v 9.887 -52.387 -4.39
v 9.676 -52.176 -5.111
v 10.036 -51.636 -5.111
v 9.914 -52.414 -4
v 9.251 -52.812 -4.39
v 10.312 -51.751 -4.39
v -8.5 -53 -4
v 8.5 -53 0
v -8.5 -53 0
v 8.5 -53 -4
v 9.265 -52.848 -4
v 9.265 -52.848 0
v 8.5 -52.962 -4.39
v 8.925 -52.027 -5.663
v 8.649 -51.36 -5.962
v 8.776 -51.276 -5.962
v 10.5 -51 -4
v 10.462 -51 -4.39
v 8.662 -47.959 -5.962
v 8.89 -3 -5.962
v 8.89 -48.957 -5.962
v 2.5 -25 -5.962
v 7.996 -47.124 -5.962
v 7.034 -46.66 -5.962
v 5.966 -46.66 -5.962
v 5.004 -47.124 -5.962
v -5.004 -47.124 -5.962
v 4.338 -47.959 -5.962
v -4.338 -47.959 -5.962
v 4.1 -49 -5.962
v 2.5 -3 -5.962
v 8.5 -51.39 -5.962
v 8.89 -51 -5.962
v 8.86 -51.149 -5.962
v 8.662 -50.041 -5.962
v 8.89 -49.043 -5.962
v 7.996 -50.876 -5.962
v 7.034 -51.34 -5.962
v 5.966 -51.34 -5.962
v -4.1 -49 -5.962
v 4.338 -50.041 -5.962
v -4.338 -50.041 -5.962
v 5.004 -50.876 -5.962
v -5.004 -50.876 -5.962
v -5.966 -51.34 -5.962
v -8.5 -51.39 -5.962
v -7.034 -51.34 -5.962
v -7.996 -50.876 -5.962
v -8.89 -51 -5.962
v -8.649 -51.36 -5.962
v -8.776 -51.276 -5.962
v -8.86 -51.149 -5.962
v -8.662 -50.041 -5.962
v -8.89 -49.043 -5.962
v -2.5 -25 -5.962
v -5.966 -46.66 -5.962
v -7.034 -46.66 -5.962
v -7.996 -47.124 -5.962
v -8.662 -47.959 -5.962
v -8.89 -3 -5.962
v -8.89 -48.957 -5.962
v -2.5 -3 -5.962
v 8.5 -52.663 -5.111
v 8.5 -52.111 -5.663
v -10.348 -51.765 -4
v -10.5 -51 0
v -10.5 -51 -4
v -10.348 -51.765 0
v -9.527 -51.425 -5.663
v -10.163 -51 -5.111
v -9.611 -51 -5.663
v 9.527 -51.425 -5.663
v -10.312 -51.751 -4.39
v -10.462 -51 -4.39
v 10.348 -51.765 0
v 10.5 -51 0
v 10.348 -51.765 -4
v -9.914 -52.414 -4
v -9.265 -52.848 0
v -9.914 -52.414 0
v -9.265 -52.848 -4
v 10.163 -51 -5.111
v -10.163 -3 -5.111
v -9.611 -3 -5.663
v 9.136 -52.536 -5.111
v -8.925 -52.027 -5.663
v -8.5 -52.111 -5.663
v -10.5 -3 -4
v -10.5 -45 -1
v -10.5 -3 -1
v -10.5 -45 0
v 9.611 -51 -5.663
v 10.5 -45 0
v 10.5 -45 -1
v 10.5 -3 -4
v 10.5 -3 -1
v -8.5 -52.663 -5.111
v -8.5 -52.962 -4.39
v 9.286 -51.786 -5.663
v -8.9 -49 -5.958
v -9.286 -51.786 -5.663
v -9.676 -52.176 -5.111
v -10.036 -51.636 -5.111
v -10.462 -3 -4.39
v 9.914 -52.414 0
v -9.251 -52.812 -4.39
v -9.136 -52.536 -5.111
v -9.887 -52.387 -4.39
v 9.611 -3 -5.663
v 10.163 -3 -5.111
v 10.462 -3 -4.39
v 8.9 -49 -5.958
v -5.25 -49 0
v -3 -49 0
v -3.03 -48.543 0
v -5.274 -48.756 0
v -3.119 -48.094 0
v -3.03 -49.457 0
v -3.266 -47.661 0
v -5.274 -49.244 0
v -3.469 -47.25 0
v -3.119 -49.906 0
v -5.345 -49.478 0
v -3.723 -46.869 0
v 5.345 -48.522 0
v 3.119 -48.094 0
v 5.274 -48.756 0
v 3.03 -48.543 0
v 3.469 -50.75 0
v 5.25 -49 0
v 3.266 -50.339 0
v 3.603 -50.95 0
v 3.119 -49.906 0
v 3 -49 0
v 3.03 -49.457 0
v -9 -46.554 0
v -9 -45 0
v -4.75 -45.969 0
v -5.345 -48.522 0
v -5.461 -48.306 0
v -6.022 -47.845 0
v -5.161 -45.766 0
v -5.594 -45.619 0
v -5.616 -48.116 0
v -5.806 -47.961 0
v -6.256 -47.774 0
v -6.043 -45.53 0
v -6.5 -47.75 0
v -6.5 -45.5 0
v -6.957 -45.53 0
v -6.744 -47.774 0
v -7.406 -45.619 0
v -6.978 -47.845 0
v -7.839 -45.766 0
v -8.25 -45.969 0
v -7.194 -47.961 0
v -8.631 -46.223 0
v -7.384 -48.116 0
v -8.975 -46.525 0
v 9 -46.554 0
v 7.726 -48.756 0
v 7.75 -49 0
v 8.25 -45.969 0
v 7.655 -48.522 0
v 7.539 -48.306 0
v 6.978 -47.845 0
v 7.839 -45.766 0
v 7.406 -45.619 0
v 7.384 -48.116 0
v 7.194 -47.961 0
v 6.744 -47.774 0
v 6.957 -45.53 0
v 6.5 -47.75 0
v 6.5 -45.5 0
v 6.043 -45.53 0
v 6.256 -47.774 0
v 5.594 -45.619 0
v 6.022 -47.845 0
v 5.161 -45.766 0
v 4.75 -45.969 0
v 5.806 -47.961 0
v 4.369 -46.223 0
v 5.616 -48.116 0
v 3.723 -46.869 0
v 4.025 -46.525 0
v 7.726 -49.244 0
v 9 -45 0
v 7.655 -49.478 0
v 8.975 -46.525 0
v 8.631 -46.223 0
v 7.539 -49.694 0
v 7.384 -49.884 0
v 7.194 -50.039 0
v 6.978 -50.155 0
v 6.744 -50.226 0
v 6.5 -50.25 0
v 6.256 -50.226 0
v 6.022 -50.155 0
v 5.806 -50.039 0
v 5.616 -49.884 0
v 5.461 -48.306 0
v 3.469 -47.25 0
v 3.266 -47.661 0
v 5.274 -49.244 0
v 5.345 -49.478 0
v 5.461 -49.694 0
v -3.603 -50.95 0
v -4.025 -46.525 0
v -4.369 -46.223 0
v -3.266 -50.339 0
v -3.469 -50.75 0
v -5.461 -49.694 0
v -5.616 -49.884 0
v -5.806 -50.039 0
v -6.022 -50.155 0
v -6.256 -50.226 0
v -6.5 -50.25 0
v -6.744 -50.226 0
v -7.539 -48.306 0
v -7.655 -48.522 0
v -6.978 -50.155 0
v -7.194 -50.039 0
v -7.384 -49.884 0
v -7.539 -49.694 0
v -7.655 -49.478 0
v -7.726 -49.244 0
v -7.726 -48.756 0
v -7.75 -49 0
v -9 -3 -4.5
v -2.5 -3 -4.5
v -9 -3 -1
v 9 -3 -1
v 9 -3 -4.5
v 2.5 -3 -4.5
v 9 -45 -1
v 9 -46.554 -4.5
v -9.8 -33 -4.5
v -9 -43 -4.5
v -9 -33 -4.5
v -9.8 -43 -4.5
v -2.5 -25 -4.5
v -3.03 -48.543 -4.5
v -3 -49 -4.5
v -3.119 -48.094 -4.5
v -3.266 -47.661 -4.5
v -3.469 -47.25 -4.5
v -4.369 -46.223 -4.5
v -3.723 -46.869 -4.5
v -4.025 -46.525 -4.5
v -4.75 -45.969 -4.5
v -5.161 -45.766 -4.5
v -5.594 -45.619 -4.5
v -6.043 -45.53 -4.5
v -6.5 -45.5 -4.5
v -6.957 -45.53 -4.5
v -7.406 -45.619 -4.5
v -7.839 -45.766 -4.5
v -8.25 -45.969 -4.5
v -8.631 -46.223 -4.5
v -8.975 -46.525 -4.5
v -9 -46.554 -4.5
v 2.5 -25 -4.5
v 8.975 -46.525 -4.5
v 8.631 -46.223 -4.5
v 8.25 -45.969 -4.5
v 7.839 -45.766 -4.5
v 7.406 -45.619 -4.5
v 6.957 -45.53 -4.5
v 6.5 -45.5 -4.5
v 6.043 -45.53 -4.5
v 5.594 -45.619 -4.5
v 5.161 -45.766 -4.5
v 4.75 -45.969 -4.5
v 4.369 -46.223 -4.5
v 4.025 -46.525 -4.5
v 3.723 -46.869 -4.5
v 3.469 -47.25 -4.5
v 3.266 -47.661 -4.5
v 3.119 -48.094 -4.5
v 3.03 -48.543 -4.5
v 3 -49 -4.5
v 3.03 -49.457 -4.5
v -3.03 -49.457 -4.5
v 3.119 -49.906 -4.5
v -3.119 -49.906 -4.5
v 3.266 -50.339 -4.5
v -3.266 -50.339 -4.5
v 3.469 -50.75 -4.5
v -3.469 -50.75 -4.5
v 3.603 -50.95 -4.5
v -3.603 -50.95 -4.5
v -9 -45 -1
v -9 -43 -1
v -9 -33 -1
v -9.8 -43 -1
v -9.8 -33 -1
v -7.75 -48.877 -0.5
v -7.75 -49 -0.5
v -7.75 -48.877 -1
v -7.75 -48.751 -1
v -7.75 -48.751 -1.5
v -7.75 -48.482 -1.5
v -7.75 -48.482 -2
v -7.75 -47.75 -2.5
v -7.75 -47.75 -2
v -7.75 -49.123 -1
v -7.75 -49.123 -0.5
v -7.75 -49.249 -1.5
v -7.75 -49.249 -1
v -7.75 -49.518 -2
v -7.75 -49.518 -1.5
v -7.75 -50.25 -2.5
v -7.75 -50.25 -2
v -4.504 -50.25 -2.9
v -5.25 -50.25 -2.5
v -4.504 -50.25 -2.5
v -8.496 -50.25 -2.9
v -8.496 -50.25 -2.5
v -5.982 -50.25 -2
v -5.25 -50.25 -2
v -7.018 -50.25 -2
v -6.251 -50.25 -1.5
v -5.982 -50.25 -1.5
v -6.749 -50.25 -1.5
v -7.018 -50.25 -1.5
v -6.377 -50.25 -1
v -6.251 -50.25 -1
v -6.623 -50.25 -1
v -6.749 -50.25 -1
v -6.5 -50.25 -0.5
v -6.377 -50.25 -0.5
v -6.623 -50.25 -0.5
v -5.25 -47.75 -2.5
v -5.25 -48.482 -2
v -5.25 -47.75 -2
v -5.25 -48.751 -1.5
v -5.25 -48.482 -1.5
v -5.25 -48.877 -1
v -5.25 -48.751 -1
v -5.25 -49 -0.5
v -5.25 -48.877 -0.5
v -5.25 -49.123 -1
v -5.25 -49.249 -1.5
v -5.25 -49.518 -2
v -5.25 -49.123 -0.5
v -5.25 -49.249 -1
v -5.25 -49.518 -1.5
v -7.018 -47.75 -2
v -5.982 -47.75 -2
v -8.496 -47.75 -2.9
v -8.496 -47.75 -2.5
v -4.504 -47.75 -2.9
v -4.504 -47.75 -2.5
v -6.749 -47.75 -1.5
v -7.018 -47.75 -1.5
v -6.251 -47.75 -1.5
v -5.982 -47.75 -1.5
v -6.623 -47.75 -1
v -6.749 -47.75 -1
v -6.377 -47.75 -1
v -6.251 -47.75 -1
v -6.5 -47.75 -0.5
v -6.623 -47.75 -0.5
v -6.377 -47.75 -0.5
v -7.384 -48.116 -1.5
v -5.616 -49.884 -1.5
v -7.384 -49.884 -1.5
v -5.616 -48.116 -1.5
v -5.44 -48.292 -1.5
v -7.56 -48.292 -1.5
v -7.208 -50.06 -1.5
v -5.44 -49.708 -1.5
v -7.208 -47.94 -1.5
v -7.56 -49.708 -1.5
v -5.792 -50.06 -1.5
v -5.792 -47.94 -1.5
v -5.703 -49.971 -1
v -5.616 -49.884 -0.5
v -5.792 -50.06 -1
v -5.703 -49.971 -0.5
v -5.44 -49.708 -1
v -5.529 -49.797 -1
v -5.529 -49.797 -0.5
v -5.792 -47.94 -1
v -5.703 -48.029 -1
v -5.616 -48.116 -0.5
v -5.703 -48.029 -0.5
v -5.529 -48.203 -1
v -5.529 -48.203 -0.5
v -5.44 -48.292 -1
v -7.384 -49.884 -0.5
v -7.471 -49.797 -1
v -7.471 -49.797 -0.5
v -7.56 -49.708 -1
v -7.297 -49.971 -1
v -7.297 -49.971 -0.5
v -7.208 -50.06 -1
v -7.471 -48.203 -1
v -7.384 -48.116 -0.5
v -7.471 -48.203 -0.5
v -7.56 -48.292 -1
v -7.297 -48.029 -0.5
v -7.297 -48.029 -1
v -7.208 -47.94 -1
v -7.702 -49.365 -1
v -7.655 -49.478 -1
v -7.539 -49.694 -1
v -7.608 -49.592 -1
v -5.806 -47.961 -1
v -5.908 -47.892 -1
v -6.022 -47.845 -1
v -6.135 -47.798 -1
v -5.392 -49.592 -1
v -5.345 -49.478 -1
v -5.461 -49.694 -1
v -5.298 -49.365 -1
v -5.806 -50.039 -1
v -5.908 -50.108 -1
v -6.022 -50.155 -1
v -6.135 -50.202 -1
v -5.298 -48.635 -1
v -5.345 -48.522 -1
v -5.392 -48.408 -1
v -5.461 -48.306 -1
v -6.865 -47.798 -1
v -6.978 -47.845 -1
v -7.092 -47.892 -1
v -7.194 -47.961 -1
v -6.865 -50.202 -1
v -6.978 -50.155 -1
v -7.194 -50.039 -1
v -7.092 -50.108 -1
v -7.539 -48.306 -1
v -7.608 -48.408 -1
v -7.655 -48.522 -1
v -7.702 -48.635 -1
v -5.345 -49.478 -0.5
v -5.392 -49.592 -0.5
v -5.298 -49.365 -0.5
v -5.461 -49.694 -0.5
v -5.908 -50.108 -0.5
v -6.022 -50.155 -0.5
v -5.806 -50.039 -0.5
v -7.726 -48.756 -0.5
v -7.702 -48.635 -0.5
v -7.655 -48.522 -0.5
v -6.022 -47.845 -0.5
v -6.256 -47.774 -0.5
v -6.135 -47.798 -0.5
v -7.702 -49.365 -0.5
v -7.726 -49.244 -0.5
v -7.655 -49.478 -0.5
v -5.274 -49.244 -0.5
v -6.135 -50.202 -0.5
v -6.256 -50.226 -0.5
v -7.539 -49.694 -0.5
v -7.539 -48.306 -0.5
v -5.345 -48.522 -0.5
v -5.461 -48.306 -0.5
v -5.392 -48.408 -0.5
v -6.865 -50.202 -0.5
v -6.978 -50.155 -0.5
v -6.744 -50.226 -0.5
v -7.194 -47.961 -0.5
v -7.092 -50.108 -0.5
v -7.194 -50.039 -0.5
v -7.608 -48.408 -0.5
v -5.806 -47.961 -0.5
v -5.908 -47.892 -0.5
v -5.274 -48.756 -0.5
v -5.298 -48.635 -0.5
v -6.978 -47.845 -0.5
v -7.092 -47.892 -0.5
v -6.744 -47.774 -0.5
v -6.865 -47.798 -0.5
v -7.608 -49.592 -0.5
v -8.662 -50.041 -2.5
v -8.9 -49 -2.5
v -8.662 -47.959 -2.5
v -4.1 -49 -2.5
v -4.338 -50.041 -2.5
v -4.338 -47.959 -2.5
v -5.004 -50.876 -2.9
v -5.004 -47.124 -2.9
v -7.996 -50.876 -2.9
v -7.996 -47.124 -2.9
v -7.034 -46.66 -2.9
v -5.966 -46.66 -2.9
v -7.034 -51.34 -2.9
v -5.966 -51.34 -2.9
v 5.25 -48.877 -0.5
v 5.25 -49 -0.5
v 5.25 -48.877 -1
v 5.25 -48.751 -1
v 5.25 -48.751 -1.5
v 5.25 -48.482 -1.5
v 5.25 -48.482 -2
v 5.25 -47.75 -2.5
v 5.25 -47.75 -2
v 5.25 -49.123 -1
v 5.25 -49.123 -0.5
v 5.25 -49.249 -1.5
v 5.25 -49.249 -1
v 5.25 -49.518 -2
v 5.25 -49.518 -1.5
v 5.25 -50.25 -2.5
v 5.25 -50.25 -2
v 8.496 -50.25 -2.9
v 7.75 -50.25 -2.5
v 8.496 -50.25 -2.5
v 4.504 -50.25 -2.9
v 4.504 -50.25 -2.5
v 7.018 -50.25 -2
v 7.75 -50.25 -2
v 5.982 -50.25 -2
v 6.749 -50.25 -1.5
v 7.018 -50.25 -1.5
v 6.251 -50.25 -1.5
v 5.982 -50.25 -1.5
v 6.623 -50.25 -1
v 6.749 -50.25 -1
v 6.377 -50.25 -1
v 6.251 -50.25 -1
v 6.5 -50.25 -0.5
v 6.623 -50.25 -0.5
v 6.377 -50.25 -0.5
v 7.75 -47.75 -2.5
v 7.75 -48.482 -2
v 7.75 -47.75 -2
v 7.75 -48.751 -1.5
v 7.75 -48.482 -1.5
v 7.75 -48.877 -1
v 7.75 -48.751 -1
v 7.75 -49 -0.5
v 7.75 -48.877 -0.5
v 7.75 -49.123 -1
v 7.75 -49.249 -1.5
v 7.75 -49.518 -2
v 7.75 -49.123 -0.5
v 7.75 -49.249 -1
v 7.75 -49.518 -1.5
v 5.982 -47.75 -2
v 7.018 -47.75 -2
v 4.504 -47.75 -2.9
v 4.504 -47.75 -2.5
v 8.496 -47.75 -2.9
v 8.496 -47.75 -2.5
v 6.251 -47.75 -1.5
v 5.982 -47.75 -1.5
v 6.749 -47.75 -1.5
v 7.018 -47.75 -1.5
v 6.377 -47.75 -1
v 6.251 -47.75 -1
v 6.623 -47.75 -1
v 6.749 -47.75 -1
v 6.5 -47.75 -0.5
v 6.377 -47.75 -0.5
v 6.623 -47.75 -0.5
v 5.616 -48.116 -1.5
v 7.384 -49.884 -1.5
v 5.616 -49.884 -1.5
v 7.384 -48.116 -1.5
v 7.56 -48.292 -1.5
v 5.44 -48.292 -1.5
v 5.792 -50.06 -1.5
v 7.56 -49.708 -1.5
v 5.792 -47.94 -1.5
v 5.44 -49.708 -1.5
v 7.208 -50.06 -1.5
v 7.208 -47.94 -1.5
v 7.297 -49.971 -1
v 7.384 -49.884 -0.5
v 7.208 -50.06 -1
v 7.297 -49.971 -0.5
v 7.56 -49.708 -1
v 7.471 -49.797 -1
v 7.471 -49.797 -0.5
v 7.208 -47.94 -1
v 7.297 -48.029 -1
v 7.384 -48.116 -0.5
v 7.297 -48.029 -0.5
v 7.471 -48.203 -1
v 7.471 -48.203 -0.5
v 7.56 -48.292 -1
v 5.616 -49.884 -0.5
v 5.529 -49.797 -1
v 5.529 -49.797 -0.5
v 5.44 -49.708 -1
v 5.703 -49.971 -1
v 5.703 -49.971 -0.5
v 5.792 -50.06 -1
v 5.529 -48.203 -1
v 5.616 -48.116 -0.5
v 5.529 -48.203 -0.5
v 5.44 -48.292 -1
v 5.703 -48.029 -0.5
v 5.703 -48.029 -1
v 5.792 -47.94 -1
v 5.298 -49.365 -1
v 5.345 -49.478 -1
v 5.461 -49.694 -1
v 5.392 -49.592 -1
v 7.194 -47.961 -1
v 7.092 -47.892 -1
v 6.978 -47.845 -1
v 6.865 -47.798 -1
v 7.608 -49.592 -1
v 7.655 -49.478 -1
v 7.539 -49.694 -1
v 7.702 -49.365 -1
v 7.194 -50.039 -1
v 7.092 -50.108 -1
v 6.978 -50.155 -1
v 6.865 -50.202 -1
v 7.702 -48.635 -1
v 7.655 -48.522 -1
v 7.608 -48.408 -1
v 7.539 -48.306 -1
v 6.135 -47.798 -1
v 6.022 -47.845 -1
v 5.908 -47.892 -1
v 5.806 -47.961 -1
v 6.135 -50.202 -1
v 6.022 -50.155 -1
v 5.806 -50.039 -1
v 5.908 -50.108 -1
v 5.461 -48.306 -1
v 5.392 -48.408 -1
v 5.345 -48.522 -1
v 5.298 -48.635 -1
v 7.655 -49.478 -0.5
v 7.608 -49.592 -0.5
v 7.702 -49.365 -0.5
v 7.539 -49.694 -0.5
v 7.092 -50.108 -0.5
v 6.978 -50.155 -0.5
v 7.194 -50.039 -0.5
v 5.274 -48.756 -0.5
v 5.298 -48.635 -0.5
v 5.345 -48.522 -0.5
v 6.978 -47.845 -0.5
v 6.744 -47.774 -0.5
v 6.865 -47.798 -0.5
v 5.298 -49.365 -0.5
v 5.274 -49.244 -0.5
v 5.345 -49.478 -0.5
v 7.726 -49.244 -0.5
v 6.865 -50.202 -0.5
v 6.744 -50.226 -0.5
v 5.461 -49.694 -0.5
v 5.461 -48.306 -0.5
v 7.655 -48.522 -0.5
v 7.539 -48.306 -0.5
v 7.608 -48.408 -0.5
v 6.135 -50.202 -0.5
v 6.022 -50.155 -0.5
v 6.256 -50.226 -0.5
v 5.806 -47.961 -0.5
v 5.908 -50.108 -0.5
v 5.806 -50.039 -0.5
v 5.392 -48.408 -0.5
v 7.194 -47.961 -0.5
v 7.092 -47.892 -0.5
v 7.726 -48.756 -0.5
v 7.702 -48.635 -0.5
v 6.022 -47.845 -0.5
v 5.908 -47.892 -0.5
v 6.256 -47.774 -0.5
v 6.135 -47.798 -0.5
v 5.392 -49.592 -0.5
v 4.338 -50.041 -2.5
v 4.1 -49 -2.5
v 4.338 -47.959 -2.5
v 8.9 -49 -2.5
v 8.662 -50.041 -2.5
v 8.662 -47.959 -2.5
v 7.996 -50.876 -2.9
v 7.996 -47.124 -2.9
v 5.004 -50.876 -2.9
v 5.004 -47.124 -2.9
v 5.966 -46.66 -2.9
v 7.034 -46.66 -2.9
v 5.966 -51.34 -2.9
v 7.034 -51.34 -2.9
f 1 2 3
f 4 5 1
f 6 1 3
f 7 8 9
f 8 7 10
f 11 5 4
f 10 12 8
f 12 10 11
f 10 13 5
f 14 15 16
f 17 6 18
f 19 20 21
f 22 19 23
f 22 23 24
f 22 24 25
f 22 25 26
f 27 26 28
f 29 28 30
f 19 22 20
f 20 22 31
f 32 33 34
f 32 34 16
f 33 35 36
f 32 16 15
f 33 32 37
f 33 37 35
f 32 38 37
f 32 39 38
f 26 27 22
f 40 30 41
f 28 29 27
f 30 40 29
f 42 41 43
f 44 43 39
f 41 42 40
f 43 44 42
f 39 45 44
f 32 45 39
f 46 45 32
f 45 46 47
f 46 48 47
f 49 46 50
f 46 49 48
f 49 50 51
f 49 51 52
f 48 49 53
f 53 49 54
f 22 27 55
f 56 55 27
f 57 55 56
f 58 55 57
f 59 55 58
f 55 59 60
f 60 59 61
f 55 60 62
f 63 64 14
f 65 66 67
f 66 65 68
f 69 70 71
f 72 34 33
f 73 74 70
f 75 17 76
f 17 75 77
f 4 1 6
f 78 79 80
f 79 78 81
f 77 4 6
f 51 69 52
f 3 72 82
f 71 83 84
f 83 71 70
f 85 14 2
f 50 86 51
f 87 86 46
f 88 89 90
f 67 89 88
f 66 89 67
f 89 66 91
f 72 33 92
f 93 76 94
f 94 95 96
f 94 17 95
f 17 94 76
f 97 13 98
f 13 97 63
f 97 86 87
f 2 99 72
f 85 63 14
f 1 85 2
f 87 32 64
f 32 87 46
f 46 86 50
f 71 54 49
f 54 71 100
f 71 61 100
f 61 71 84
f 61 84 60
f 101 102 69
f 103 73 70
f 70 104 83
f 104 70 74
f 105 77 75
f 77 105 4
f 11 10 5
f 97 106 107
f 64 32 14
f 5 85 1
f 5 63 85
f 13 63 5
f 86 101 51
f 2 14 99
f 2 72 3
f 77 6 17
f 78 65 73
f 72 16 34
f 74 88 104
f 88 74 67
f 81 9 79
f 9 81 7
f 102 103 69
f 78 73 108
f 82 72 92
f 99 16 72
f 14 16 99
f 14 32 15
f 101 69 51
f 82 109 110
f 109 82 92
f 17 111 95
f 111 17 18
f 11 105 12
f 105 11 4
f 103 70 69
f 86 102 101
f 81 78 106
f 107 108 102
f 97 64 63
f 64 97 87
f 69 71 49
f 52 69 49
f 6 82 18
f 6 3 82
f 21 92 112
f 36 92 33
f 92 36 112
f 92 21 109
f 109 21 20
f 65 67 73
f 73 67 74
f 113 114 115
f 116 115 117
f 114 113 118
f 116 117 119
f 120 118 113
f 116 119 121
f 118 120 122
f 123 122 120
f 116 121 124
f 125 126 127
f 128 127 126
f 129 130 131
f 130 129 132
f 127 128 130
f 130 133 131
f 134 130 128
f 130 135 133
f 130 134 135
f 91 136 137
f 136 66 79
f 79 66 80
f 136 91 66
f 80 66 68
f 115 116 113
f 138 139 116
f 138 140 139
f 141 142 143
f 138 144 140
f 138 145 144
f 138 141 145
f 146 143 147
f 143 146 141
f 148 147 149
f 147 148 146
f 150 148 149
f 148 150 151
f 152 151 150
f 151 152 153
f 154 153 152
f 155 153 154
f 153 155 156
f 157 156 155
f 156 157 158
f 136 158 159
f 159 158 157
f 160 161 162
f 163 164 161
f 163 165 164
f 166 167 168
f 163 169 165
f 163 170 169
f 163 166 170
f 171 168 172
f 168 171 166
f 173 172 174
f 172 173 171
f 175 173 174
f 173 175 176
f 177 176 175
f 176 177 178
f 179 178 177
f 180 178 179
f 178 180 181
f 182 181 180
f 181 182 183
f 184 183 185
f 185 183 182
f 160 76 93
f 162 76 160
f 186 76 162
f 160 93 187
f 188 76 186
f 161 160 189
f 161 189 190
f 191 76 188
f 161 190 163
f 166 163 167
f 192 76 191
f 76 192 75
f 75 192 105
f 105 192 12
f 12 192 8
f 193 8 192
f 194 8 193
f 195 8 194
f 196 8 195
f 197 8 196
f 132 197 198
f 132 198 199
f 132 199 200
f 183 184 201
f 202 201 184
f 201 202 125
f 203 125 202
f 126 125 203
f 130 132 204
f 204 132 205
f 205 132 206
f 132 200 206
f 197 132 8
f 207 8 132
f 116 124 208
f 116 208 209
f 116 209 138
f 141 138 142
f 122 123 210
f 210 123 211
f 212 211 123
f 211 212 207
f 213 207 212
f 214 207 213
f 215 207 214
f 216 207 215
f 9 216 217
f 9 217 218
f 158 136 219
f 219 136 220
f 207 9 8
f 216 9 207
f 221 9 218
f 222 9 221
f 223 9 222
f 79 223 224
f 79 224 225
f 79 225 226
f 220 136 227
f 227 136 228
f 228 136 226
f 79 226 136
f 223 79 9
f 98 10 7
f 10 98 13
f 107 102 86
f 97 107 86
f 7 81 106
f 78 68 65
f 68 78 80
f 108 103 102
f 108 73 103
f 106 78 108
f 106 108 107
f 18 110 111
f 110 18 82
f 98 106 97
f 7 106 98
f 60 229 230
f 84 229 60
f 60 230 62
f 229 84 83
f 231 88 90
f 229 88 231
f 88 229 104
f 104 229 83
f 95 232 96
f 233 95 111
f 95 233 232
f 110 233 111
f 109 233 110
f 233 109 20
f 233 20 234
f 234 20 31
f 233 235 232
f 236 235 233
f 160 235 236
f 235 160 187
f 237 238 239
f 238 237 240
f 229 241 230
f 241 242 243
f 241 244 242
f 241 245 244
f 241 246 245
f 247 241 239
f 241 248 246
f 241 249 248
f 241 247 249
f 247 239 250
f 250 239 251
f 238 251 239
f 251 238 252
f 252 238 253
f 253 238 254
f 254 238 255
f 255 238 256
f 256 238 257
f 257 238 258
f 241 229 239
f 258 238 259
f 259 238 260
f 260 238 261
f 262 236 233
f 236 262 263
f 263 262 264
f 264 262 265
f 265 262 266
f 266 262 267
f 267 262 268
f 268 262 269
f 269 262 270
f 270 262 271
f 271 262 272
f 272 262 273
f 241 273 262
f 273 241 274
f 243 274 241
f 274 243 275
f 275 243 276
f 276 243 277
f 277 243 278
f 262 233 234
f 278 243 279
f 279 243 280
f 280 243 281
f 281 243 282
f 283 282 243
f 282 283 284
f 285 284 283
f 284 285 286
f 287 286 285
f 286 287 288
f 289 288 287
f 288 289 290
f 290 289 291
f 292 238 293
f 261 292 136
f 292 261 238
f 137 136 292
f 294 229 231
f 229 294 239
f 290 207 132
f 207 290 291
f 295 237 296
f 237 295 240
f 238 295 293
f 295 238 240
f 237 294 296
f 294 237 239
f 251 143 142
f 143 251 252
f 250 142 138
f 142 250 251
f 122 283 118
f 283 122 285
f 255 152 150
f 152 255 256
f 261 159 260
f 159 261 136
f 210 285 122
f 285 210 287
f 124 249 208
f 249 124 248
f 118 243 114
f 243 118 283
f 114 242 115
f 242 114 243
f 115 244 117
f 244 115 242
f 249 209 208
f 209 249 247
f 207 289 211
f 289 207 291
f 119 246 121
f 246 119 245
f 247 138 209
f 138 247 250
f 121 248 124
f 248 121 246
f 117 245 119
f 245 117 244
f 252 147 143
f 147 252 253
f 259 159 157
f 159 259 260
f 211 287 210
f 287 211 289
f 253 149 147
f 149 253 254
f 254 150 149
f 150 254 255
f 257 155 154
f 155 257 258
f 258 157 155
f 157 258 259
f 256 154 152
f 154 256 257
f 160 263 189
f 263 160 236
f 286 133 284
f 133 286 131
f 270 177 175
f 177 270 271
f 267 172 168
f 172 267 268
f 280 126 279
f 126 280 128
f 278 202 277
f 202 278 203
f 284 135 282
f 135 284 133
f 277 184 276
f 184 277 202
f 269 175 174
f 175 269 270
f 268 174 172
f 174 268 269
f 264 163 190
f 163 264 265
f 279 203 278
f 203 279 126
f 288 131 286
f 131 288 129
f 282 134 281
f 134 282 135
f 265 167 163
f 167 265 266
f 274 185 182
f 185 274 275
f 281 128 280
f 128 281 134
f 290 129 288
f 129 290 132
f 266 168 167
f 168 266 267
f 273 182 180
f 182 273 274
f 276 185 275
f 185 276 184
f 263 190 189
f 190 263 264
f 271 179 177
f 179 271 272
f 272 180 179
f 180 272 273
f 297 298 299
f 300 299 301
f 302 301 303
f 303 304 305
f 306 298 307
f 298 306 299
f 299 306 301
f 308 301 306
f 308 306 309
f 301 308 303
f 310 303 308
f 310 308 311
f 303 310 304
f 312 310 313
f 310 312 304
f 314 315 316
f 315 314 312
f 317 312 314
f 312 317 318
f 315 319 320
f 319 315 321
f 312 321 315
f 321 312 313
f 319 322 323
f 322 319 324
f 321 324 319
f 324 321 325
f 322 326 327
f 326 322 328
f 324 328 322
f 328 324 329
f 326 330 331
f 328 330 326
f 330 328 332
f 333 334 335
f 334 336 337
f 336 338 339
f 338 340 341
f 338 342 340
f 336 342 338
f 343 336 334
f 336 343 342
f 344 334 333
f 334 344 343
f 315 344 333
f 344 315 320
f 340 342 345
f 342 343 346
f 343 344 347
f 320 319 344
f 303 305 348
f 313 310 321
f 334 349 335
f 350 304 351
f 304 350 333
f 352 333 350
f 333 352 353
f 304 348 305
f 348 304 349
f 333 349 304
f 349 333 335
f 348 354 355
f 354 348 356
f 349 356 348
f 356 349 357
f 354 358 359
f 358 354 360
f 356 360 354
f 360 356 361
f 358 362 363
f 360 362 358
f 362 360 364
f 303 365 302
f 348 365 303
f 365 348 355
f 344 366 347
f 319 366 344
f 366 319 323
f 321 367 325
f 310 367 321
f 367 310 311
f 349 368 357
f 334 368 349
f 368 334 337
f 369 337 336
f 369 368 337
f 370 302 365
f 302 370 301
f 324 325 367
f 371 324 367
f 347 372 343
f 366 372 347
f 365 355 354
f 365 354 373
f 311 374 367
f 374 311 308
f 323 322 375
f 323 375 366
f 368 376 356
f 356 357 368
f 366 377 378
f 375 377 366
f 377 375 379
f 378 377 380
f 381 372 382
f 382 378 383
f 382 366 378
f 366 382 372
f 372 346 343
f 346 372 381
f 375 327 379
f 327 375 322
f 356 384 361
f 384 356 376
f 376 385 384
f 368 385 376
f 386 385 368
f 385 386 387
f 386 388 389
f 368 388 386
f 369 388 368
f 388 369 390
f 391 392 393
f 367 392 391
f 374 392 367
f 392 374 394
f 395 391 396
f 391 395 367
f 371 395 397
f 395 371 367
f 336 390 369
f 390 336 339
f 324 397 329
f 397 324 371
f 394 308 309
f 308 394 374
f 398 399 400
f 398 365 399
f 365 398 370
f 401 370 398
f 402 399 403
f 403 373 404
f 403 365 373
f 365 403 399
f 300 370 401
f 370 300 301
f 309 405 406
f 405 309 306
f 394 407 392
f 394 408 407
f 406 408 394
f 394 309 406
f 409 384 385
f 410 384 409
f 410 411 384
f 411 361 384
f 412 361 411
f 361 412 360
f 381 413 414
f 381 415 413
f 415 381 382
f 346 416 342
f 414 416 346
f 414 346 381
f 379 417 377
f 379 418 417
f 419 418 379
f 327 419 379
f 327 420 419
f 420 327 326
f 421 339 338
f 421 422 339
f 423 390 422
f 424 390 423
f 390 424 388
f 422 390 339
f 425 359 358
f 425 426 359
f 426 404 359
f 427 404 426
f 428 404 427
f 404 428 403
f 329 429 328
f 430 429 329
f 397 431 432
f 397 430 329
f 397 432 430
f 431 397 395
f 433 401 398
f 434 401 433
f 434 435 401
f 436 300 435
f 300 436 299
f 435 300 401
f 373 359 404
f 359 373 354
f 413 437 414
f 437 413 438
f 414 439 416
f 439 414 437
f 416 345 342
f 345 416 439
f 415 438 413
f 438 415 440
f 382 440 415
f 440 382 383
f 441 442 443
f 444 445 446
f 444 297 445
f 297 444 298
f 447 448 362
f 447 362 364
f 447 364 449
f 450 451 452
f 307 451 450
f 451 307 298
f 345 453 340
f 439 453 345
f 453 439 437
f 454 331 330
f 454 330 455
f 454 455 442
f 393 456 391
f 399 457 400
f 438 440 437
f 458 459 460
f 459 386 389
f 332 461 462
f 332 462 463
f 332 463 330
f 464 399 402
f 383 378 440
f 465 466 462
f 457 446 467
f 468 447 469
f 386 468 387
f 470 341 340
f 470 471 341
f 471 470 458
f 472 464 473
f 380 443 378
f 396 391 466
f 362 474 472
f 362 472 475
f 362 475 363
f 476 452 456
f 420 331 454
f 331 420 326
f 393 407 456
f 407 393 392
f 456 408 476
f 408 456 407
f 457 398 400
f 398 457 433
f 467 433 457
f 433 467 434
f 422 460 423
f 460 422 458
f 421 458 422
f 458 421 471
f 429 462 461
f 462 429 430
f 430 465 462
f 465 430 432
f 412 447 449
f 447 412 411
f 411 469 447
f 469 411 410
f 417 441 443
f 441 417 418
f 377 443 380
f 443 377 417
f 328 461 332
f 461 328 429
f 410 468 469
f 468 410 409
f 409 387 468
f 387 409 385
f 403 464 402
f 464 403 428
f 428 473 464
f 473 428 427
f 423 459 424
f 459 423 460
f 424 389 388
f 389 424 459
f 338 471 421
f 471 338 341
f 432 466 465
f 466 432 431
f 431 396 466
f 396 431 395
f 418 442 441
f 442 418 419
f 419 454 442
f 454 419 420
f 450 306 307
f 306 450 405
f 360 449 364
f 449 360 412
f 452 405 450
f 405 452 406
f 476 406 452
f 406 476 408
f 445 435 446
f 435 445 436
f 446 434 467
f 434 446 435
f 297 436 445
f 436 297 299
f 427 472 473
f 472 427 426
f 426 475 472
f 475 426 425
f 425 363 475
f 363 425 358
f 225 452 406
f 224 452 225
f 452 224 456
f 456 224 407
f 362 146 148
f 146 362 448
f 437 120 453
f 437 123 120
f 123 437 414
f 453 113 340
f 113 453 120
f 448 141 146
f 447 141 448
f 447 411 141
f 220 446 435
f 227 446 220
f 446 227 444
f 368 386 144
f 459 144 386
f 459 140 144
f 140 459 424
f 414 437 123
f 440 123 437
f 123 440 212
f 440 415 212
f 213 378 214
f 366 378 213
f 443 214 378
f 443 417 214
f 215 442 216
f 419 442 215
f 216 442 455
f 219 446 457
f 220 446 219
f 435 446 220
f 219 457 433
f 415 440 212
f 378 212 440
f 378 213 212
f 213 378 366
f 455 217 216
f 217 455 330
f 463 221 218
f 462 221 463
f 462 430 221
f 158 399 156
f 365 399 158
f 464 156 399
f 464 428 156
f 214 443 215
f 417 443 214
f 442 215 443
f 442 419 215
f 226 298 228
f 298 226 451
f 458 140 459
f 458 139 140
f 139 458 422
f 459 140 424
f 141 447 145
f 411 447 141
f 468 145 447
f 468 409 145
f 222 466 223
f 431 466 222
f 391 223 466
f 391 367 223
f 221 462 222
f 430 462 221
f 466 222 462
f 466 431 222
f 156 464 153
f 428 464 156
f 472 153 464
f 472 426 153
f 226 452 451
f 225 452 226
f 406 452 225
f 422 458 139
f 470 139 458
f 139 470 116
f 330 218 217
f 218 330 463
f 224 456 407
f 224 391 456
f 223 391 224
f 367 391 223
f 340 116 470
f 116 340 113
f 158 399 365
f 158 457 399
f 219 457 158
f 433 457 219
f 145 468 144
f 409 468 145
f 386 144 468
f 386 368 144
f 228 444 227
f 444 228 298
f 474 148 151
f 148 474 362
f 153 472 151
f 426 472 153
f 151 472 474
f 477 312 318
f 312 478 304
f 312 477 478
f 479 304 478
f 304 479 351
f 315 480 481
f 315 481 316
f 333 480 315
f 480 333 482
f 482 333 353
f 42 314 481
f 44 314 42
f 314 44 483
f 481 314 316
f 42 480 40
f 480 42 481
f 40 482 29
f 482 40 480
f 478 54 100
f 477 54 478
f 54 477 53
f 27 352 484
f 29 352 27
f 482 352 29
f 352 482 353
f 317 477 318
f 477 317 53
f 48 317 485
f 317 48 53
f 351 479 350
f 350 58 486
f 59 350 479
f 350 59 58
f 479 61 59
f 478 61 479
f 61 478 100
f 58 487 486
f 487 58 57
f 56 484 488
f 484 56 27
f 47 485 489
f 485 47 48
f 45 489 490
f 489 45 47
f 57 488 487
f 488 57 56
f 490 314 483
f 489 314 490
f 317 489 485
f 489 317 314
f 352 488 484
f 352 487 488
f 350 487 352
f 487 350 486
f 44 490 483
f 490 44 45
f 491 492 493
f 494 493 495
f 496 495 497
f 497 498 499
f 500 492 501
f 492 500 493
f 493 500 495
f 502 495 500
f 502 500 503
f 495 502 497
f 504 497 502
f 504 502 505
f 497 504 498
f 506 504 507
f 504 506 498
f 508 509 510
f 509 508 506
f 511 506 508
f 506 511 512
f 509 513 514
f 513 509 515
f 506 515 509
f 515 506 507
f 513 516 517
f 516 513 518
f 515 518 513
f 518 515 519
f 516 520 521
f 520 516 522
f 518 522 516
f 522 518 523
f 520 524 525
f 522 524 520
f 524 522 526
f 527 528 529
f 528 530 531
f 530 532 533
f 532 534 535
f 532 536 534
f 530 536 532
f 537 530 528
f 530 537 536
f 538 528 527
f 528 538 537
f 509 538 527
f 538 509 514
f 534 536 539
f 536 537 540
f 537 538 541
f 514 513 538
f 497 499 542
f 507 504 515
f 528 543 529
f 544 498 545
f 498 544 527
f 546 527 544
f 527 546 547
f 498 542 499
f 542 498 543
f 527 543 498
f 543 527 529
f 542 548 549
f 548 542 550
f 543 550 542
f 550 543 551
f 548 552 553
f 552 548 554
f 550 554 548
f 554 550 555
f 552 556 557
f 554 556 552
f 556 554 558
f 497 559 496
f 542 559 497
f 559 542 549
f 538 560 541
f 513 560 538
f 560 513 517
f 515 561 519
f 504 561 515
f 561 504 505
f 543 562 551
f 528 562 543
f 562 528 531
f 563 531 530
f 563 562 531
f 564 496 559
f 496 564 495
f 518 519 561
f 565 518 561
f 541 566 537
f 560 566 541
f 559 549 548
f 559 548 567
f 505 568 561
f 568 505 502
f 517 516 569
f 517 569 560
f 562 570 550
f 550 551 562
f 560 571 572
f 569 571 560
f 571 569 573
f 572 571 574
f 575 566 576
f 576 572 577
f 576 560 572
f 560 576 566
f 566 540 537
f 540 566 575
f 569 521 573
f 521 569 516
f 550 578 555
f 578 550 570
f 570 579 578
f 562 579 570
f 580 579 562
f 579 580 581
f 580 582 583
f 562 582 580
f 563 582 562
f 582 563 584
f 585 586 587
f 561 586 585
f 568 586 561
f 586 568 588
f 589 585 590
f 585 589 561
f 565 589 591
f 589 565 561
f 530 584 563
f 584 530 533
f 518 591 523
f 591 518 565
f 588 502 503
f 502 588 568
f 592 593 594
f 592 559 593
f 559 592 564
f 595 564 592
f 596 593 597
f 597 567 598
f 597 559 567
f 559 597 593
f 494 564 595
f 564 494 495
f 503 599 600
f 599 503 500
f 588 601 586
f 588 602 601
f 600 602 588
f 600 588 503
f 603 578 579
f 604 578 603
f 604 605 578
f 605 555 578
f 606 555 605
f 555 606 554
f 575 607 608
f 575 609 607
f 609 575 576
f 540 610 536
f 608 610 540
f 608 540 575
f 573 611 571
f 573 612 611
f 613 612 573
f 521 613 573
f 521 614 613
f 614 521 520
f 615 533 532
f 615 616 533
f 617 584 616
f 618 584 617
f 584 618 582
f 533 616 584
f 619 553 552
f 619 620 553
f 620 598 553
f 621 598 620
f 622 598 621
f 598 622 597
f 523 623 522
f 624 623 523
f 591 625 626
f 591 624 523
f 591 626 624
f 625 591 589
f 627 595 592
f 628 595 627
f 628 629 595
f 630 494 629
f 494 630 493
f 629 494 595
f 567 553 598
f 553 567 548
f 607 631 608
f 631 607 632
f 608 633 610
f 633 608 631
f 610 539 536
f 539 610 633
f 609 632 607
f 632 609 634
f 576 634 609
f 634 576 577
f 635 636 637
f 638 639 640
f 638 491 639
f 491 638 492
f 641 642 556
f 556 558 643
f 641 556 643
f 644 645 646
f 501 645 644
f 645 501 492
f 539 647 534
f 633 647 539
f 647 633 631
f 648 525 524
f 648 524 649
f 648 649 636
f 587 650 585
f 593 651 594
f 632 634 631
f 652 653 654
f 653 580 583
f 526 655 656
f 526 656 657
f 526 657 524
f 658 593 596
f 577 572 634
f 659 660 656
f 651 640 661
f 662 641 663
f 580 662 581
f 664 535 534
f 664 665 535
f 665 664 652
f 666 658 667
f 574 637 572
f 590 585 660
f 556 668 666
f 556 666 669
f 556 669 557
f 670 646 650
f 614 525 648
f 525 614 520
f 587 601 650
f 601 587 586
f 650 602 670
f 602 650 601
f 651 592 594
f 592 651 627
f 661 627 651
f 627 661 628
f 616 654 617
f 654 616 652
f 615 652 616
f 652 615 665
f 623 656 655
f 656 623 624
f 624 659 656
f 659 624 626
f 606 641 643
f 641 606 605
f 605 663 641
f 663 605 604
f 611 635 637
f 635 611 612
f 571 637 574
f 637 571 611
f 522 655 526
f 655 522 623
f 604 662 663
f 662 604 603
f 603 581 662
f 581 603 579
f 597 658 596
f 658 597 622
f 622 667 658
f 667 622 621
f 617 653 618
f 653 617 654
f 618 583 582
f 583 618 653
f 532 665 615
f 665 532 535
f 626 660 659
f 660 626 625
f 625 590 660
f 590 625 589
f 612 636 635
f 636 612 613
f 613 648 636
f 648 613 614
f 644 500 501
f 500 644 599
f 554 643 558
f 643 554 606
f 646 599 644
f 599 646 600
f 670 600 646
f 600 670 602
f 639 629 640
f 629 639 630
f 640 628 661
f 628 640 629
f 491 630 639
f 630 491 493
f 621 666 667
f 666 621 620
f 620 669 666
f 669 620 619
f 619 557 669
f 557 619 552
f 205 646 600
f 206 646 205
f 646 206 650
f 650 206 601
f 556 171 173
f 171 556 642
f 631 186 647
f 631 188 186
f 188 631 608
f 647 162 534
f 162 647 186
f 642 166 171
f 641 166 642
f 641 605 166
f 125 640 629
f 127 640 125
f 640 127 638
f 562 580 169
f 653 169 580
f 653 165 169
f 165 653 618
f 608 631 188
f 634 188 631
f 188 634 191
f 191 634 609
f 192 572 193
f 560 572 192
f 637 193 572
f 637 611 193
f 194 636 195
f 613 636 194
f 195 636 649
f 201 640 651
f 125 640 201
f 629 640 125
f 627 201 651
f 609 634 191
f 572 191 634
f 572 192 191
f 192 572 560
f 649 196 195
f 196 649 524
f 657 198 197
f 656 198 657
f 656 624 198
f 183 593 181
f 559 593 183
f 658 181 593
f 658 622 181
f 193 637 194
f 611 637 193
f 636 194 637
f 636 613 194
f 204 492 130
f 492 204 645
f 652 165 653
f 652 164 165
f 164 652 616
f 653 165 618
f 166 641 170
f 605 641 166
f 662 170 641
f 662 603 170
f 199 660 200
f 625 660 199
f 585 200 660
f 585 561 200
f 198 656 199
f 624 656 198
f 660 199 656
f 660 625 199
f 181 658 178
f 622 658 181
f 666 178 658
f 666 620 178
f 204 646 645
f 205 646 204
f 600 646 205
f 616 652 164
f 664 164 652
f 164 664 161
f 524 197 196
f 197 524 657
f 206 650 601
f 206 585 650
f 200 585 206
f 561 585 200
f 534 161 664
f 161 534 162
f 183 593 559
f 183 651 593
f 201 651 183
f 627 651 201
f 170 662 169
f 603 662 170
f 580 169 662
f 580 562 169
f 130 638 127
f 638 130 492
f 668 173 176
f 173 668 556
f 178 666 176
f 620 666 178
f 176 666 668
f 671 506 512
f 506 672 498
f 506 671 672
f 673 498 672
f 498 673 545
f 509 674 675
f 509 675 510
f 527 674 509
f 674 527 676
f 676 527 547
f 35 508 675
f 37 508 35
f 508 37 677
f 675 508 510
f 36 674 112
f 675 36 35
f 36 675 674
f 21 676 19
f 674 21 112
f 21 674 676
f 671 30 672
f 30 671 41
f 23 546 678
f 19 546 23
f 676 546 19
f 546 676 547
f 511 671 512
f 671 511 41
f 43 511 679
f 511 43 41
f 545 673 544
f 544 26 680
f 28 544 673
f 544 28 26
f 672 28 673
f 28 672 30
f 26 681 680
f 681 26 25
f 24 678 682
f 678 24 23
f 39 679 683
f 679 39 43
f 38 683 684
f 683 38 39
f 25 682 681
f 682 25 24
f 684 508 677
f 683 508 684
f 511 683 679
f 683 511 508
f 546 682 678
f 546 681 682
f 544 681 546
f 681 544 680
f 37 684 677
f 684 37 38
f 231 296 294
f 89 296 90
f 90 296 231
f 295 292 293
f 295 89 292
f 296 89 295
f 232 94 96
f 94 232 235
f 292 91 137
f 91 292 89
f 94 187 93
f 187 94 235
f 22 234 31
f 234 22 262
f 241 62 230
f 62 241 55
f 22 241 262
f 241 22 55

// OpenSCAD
// file: libs/libdict.scad
// This library add dictionary like features to openscad
// the dictionary is a list of pairs as we cannot define new types.
// Unlike a python dictionary we cannot do a proper hash table for speed
// so everything is build around the OpenSCAD search function
// There are a lot of assert statements to ensure data in the "dictionary"
// is in the format of
// * A list of lists
// * Each internal list has a length of two
// * First element of each internal list is a string (the key)
// * All keys are unique.


// Private function:
// This function returns true if the value is in the list
// value must be a string.
// No error checking, for use by is_in only!
function _is_in_str(value, list) =
    search([value], list) != [[]];

// Private function:
// This function returns true if the value is in the list
// value must be a number.
// No error checking, for use by is_in only!
function _is_in_num(value, list) =
    search(value, list) != [];


// This function returns true if the value is in the list
// value must be a string or a number.
function is_in(value, list) =
    assert(is_num(value) || is_string(value) , "is_in: value must be a number or string")
    assert(is_list(list), "is_in: list must be a list")
    is_num(value) ? _is_in_num(value, list) : _is_in_str(value, list);

/**
 * Sum a list
 * This recursive function sums a list.  It should be called with one
 * argument (the list); the other two arguments simply allow it to be
 * "tail-recursive" which lets OpenSCAD optimise it better.  This is
 * very close to the example given in the OpenSCAD docs.
 */
function _libdict_sum_list(list, starting_element=0, running_total=0) =
    starting_element >= len(list) ?
        running_total :
        _libdict_sum_list(list, starting_element + 1, running_total + list[starting_element]);

/**
 * When checking a list for uniqueness, we can get "errant matches".
 * An errant match is when a non-list matches with the first element in a list.
 * i.e. it would consider [1, [1,0]] to be non-unique. We cannot know which 
 * element is the non-list but we do know that it is errant if exactly one 
 * of them is not a list.
 * If two elements are non-lists, they must be identical in order to have matched.  
 * Similarly, if all elements are lists, they must be identical because ``search`` 
 * will have matched them as whole lists.
 * The argument "list" is the list we are checking for uniqueness, and "match" is 
 * a vector of indices that have been returned by ``search``.
 */
function _check_errant_match(list, match) = let(
    non_list = [for (m = match) is_list(list[m])? 0 : 1],
    number_of_non_lists = _libdict_sum_list(non_list)
) number_of_non_lists == 1 ? 0 : 1;

// Returns true if all emements in list are unique.
function is_unique(list) =
    assert(is_list(list), "is_unique: list must be a list")
    let(
        matches = search(list, list, 0),
        // Assign 1 or 0 depending on is the match length for each element
        // return wether any matches are greater than one (mathcing more than
        // itself)
        // note cannot search for true or false so using 1 and zero
        bool_list = [for (match = matches) if (len(match)==1) 0
            // should put a 1 here to show they matched but in the case of
            // [1, [1]] it will match both, so need to check if they are
            // both lists or both not list
            else _check_errant_match(list, match)]
    ) !is_in(1, bool_list);

// Private function:
// Checks that the input is a list and that every element is a list
// of length 2.
// No error checking, for use by valid_dict only!
function _is_pairs(list) =
    !is_list(list) ? false :
        len(list)==0 ? false :
            !is_in(0, [for (pair = list) is_list(pair) && len(pair)==2 ? 1: 0]);

// Private function:
// Checks all elements in the list are strings
// No error checking, for use by valid_dict only!
// Strings can't be empty
function _is_list_of_strings(list) =
    !is_in(0, [for (item = list) is_string(item) && len(item)>0 ? 1: 0]);

// Private function:
// Returns the keus in a dictionary
// No error checking, for use by valid_dict only!
function _keylist(dict)  = [for (pair=dict) pair[0]];

function valid_dict(dict) =
    //if the input are not pairs return instantly
    !_is_pairs(dict) ? false : let (
        //if they are pairs get all keys
        keys = _keylist(dict),
        all_strings =  _is_list_of_strings(keys),
        unique = is_unique(keys)
    ) (all_strings && unique) ? true : false;

// Key lookup for key value pair "dictionary".
// Unlike the built in lookup this works with strings.
function key_lookup(key, dict) =
    assert(is_string(key), "`key` must be a string")
    assert(valid_dict(dict), "`dict` must be a valid 'dictionary'")
    let(
        // key is in [] because otherwise openscad will search for each letter rather than the string.
        index = search([key], dict, 1, 0)[0]
    )  assert (index!=[], "Key lookup failed, key not found!") dict[index][1];

// Creates a new dictionary with a key value pair replaced. Pair must already
// be in dictionary.
function replace_value(key, value, dict) =
    assert(is_string(key), "`key` must be a string")
    assert(valid_dict(dict), "`dict` must be a valid 'dictionary'")
    assert(is_in(key, _keylist(dict)), "`key` not found in dictionary!")
    [for (kv_pair = dict) key!=kv_pair[0] ? kv_pair : [key, value]];


// Creates a new dictionary with a a set of key value pair replaced
// both inputs must be a dictionary. All keys in input must already be
// in dictionary
function replace_multiple_values(rep_dict, dict) =
    assert(valid_dict(rep_dict), "`rep dict` must be a valid 'dictionary'")
    assert(valid_dict(dict), "`dict` must be a valid 'dictionary'")
    let(
        // loop over all keys in replacement dict checking they are in the original
        rep_keys = [for (key = _keylist(rep_dict))
            assert(is_in(key, _keylist(dict)), "`key` not found in dictionary!")
            key
        ]
    ) //Finally return the updated dictionary using this long list comprehension.
    [
        for (kv_pair = dict) let(
            key = kv_pair[0],
            // check if this key is in the replacement dictionary and if so return index
            // key is in [] because otherwise openscad will search for each letter rather
            // than the string.
            index = search([key], rep_dict, 1, 0)[0]
            // if index is empty return original key value pair, else return the key with
            // the replaced value
        ) index == [] ? kv_pair : [key, rep_dict[index][1]]
    ];
// main file
use <./libs/cameras/logitech_c270.scad>

rotate([180,0,0]){
    c270_backshell();
}
